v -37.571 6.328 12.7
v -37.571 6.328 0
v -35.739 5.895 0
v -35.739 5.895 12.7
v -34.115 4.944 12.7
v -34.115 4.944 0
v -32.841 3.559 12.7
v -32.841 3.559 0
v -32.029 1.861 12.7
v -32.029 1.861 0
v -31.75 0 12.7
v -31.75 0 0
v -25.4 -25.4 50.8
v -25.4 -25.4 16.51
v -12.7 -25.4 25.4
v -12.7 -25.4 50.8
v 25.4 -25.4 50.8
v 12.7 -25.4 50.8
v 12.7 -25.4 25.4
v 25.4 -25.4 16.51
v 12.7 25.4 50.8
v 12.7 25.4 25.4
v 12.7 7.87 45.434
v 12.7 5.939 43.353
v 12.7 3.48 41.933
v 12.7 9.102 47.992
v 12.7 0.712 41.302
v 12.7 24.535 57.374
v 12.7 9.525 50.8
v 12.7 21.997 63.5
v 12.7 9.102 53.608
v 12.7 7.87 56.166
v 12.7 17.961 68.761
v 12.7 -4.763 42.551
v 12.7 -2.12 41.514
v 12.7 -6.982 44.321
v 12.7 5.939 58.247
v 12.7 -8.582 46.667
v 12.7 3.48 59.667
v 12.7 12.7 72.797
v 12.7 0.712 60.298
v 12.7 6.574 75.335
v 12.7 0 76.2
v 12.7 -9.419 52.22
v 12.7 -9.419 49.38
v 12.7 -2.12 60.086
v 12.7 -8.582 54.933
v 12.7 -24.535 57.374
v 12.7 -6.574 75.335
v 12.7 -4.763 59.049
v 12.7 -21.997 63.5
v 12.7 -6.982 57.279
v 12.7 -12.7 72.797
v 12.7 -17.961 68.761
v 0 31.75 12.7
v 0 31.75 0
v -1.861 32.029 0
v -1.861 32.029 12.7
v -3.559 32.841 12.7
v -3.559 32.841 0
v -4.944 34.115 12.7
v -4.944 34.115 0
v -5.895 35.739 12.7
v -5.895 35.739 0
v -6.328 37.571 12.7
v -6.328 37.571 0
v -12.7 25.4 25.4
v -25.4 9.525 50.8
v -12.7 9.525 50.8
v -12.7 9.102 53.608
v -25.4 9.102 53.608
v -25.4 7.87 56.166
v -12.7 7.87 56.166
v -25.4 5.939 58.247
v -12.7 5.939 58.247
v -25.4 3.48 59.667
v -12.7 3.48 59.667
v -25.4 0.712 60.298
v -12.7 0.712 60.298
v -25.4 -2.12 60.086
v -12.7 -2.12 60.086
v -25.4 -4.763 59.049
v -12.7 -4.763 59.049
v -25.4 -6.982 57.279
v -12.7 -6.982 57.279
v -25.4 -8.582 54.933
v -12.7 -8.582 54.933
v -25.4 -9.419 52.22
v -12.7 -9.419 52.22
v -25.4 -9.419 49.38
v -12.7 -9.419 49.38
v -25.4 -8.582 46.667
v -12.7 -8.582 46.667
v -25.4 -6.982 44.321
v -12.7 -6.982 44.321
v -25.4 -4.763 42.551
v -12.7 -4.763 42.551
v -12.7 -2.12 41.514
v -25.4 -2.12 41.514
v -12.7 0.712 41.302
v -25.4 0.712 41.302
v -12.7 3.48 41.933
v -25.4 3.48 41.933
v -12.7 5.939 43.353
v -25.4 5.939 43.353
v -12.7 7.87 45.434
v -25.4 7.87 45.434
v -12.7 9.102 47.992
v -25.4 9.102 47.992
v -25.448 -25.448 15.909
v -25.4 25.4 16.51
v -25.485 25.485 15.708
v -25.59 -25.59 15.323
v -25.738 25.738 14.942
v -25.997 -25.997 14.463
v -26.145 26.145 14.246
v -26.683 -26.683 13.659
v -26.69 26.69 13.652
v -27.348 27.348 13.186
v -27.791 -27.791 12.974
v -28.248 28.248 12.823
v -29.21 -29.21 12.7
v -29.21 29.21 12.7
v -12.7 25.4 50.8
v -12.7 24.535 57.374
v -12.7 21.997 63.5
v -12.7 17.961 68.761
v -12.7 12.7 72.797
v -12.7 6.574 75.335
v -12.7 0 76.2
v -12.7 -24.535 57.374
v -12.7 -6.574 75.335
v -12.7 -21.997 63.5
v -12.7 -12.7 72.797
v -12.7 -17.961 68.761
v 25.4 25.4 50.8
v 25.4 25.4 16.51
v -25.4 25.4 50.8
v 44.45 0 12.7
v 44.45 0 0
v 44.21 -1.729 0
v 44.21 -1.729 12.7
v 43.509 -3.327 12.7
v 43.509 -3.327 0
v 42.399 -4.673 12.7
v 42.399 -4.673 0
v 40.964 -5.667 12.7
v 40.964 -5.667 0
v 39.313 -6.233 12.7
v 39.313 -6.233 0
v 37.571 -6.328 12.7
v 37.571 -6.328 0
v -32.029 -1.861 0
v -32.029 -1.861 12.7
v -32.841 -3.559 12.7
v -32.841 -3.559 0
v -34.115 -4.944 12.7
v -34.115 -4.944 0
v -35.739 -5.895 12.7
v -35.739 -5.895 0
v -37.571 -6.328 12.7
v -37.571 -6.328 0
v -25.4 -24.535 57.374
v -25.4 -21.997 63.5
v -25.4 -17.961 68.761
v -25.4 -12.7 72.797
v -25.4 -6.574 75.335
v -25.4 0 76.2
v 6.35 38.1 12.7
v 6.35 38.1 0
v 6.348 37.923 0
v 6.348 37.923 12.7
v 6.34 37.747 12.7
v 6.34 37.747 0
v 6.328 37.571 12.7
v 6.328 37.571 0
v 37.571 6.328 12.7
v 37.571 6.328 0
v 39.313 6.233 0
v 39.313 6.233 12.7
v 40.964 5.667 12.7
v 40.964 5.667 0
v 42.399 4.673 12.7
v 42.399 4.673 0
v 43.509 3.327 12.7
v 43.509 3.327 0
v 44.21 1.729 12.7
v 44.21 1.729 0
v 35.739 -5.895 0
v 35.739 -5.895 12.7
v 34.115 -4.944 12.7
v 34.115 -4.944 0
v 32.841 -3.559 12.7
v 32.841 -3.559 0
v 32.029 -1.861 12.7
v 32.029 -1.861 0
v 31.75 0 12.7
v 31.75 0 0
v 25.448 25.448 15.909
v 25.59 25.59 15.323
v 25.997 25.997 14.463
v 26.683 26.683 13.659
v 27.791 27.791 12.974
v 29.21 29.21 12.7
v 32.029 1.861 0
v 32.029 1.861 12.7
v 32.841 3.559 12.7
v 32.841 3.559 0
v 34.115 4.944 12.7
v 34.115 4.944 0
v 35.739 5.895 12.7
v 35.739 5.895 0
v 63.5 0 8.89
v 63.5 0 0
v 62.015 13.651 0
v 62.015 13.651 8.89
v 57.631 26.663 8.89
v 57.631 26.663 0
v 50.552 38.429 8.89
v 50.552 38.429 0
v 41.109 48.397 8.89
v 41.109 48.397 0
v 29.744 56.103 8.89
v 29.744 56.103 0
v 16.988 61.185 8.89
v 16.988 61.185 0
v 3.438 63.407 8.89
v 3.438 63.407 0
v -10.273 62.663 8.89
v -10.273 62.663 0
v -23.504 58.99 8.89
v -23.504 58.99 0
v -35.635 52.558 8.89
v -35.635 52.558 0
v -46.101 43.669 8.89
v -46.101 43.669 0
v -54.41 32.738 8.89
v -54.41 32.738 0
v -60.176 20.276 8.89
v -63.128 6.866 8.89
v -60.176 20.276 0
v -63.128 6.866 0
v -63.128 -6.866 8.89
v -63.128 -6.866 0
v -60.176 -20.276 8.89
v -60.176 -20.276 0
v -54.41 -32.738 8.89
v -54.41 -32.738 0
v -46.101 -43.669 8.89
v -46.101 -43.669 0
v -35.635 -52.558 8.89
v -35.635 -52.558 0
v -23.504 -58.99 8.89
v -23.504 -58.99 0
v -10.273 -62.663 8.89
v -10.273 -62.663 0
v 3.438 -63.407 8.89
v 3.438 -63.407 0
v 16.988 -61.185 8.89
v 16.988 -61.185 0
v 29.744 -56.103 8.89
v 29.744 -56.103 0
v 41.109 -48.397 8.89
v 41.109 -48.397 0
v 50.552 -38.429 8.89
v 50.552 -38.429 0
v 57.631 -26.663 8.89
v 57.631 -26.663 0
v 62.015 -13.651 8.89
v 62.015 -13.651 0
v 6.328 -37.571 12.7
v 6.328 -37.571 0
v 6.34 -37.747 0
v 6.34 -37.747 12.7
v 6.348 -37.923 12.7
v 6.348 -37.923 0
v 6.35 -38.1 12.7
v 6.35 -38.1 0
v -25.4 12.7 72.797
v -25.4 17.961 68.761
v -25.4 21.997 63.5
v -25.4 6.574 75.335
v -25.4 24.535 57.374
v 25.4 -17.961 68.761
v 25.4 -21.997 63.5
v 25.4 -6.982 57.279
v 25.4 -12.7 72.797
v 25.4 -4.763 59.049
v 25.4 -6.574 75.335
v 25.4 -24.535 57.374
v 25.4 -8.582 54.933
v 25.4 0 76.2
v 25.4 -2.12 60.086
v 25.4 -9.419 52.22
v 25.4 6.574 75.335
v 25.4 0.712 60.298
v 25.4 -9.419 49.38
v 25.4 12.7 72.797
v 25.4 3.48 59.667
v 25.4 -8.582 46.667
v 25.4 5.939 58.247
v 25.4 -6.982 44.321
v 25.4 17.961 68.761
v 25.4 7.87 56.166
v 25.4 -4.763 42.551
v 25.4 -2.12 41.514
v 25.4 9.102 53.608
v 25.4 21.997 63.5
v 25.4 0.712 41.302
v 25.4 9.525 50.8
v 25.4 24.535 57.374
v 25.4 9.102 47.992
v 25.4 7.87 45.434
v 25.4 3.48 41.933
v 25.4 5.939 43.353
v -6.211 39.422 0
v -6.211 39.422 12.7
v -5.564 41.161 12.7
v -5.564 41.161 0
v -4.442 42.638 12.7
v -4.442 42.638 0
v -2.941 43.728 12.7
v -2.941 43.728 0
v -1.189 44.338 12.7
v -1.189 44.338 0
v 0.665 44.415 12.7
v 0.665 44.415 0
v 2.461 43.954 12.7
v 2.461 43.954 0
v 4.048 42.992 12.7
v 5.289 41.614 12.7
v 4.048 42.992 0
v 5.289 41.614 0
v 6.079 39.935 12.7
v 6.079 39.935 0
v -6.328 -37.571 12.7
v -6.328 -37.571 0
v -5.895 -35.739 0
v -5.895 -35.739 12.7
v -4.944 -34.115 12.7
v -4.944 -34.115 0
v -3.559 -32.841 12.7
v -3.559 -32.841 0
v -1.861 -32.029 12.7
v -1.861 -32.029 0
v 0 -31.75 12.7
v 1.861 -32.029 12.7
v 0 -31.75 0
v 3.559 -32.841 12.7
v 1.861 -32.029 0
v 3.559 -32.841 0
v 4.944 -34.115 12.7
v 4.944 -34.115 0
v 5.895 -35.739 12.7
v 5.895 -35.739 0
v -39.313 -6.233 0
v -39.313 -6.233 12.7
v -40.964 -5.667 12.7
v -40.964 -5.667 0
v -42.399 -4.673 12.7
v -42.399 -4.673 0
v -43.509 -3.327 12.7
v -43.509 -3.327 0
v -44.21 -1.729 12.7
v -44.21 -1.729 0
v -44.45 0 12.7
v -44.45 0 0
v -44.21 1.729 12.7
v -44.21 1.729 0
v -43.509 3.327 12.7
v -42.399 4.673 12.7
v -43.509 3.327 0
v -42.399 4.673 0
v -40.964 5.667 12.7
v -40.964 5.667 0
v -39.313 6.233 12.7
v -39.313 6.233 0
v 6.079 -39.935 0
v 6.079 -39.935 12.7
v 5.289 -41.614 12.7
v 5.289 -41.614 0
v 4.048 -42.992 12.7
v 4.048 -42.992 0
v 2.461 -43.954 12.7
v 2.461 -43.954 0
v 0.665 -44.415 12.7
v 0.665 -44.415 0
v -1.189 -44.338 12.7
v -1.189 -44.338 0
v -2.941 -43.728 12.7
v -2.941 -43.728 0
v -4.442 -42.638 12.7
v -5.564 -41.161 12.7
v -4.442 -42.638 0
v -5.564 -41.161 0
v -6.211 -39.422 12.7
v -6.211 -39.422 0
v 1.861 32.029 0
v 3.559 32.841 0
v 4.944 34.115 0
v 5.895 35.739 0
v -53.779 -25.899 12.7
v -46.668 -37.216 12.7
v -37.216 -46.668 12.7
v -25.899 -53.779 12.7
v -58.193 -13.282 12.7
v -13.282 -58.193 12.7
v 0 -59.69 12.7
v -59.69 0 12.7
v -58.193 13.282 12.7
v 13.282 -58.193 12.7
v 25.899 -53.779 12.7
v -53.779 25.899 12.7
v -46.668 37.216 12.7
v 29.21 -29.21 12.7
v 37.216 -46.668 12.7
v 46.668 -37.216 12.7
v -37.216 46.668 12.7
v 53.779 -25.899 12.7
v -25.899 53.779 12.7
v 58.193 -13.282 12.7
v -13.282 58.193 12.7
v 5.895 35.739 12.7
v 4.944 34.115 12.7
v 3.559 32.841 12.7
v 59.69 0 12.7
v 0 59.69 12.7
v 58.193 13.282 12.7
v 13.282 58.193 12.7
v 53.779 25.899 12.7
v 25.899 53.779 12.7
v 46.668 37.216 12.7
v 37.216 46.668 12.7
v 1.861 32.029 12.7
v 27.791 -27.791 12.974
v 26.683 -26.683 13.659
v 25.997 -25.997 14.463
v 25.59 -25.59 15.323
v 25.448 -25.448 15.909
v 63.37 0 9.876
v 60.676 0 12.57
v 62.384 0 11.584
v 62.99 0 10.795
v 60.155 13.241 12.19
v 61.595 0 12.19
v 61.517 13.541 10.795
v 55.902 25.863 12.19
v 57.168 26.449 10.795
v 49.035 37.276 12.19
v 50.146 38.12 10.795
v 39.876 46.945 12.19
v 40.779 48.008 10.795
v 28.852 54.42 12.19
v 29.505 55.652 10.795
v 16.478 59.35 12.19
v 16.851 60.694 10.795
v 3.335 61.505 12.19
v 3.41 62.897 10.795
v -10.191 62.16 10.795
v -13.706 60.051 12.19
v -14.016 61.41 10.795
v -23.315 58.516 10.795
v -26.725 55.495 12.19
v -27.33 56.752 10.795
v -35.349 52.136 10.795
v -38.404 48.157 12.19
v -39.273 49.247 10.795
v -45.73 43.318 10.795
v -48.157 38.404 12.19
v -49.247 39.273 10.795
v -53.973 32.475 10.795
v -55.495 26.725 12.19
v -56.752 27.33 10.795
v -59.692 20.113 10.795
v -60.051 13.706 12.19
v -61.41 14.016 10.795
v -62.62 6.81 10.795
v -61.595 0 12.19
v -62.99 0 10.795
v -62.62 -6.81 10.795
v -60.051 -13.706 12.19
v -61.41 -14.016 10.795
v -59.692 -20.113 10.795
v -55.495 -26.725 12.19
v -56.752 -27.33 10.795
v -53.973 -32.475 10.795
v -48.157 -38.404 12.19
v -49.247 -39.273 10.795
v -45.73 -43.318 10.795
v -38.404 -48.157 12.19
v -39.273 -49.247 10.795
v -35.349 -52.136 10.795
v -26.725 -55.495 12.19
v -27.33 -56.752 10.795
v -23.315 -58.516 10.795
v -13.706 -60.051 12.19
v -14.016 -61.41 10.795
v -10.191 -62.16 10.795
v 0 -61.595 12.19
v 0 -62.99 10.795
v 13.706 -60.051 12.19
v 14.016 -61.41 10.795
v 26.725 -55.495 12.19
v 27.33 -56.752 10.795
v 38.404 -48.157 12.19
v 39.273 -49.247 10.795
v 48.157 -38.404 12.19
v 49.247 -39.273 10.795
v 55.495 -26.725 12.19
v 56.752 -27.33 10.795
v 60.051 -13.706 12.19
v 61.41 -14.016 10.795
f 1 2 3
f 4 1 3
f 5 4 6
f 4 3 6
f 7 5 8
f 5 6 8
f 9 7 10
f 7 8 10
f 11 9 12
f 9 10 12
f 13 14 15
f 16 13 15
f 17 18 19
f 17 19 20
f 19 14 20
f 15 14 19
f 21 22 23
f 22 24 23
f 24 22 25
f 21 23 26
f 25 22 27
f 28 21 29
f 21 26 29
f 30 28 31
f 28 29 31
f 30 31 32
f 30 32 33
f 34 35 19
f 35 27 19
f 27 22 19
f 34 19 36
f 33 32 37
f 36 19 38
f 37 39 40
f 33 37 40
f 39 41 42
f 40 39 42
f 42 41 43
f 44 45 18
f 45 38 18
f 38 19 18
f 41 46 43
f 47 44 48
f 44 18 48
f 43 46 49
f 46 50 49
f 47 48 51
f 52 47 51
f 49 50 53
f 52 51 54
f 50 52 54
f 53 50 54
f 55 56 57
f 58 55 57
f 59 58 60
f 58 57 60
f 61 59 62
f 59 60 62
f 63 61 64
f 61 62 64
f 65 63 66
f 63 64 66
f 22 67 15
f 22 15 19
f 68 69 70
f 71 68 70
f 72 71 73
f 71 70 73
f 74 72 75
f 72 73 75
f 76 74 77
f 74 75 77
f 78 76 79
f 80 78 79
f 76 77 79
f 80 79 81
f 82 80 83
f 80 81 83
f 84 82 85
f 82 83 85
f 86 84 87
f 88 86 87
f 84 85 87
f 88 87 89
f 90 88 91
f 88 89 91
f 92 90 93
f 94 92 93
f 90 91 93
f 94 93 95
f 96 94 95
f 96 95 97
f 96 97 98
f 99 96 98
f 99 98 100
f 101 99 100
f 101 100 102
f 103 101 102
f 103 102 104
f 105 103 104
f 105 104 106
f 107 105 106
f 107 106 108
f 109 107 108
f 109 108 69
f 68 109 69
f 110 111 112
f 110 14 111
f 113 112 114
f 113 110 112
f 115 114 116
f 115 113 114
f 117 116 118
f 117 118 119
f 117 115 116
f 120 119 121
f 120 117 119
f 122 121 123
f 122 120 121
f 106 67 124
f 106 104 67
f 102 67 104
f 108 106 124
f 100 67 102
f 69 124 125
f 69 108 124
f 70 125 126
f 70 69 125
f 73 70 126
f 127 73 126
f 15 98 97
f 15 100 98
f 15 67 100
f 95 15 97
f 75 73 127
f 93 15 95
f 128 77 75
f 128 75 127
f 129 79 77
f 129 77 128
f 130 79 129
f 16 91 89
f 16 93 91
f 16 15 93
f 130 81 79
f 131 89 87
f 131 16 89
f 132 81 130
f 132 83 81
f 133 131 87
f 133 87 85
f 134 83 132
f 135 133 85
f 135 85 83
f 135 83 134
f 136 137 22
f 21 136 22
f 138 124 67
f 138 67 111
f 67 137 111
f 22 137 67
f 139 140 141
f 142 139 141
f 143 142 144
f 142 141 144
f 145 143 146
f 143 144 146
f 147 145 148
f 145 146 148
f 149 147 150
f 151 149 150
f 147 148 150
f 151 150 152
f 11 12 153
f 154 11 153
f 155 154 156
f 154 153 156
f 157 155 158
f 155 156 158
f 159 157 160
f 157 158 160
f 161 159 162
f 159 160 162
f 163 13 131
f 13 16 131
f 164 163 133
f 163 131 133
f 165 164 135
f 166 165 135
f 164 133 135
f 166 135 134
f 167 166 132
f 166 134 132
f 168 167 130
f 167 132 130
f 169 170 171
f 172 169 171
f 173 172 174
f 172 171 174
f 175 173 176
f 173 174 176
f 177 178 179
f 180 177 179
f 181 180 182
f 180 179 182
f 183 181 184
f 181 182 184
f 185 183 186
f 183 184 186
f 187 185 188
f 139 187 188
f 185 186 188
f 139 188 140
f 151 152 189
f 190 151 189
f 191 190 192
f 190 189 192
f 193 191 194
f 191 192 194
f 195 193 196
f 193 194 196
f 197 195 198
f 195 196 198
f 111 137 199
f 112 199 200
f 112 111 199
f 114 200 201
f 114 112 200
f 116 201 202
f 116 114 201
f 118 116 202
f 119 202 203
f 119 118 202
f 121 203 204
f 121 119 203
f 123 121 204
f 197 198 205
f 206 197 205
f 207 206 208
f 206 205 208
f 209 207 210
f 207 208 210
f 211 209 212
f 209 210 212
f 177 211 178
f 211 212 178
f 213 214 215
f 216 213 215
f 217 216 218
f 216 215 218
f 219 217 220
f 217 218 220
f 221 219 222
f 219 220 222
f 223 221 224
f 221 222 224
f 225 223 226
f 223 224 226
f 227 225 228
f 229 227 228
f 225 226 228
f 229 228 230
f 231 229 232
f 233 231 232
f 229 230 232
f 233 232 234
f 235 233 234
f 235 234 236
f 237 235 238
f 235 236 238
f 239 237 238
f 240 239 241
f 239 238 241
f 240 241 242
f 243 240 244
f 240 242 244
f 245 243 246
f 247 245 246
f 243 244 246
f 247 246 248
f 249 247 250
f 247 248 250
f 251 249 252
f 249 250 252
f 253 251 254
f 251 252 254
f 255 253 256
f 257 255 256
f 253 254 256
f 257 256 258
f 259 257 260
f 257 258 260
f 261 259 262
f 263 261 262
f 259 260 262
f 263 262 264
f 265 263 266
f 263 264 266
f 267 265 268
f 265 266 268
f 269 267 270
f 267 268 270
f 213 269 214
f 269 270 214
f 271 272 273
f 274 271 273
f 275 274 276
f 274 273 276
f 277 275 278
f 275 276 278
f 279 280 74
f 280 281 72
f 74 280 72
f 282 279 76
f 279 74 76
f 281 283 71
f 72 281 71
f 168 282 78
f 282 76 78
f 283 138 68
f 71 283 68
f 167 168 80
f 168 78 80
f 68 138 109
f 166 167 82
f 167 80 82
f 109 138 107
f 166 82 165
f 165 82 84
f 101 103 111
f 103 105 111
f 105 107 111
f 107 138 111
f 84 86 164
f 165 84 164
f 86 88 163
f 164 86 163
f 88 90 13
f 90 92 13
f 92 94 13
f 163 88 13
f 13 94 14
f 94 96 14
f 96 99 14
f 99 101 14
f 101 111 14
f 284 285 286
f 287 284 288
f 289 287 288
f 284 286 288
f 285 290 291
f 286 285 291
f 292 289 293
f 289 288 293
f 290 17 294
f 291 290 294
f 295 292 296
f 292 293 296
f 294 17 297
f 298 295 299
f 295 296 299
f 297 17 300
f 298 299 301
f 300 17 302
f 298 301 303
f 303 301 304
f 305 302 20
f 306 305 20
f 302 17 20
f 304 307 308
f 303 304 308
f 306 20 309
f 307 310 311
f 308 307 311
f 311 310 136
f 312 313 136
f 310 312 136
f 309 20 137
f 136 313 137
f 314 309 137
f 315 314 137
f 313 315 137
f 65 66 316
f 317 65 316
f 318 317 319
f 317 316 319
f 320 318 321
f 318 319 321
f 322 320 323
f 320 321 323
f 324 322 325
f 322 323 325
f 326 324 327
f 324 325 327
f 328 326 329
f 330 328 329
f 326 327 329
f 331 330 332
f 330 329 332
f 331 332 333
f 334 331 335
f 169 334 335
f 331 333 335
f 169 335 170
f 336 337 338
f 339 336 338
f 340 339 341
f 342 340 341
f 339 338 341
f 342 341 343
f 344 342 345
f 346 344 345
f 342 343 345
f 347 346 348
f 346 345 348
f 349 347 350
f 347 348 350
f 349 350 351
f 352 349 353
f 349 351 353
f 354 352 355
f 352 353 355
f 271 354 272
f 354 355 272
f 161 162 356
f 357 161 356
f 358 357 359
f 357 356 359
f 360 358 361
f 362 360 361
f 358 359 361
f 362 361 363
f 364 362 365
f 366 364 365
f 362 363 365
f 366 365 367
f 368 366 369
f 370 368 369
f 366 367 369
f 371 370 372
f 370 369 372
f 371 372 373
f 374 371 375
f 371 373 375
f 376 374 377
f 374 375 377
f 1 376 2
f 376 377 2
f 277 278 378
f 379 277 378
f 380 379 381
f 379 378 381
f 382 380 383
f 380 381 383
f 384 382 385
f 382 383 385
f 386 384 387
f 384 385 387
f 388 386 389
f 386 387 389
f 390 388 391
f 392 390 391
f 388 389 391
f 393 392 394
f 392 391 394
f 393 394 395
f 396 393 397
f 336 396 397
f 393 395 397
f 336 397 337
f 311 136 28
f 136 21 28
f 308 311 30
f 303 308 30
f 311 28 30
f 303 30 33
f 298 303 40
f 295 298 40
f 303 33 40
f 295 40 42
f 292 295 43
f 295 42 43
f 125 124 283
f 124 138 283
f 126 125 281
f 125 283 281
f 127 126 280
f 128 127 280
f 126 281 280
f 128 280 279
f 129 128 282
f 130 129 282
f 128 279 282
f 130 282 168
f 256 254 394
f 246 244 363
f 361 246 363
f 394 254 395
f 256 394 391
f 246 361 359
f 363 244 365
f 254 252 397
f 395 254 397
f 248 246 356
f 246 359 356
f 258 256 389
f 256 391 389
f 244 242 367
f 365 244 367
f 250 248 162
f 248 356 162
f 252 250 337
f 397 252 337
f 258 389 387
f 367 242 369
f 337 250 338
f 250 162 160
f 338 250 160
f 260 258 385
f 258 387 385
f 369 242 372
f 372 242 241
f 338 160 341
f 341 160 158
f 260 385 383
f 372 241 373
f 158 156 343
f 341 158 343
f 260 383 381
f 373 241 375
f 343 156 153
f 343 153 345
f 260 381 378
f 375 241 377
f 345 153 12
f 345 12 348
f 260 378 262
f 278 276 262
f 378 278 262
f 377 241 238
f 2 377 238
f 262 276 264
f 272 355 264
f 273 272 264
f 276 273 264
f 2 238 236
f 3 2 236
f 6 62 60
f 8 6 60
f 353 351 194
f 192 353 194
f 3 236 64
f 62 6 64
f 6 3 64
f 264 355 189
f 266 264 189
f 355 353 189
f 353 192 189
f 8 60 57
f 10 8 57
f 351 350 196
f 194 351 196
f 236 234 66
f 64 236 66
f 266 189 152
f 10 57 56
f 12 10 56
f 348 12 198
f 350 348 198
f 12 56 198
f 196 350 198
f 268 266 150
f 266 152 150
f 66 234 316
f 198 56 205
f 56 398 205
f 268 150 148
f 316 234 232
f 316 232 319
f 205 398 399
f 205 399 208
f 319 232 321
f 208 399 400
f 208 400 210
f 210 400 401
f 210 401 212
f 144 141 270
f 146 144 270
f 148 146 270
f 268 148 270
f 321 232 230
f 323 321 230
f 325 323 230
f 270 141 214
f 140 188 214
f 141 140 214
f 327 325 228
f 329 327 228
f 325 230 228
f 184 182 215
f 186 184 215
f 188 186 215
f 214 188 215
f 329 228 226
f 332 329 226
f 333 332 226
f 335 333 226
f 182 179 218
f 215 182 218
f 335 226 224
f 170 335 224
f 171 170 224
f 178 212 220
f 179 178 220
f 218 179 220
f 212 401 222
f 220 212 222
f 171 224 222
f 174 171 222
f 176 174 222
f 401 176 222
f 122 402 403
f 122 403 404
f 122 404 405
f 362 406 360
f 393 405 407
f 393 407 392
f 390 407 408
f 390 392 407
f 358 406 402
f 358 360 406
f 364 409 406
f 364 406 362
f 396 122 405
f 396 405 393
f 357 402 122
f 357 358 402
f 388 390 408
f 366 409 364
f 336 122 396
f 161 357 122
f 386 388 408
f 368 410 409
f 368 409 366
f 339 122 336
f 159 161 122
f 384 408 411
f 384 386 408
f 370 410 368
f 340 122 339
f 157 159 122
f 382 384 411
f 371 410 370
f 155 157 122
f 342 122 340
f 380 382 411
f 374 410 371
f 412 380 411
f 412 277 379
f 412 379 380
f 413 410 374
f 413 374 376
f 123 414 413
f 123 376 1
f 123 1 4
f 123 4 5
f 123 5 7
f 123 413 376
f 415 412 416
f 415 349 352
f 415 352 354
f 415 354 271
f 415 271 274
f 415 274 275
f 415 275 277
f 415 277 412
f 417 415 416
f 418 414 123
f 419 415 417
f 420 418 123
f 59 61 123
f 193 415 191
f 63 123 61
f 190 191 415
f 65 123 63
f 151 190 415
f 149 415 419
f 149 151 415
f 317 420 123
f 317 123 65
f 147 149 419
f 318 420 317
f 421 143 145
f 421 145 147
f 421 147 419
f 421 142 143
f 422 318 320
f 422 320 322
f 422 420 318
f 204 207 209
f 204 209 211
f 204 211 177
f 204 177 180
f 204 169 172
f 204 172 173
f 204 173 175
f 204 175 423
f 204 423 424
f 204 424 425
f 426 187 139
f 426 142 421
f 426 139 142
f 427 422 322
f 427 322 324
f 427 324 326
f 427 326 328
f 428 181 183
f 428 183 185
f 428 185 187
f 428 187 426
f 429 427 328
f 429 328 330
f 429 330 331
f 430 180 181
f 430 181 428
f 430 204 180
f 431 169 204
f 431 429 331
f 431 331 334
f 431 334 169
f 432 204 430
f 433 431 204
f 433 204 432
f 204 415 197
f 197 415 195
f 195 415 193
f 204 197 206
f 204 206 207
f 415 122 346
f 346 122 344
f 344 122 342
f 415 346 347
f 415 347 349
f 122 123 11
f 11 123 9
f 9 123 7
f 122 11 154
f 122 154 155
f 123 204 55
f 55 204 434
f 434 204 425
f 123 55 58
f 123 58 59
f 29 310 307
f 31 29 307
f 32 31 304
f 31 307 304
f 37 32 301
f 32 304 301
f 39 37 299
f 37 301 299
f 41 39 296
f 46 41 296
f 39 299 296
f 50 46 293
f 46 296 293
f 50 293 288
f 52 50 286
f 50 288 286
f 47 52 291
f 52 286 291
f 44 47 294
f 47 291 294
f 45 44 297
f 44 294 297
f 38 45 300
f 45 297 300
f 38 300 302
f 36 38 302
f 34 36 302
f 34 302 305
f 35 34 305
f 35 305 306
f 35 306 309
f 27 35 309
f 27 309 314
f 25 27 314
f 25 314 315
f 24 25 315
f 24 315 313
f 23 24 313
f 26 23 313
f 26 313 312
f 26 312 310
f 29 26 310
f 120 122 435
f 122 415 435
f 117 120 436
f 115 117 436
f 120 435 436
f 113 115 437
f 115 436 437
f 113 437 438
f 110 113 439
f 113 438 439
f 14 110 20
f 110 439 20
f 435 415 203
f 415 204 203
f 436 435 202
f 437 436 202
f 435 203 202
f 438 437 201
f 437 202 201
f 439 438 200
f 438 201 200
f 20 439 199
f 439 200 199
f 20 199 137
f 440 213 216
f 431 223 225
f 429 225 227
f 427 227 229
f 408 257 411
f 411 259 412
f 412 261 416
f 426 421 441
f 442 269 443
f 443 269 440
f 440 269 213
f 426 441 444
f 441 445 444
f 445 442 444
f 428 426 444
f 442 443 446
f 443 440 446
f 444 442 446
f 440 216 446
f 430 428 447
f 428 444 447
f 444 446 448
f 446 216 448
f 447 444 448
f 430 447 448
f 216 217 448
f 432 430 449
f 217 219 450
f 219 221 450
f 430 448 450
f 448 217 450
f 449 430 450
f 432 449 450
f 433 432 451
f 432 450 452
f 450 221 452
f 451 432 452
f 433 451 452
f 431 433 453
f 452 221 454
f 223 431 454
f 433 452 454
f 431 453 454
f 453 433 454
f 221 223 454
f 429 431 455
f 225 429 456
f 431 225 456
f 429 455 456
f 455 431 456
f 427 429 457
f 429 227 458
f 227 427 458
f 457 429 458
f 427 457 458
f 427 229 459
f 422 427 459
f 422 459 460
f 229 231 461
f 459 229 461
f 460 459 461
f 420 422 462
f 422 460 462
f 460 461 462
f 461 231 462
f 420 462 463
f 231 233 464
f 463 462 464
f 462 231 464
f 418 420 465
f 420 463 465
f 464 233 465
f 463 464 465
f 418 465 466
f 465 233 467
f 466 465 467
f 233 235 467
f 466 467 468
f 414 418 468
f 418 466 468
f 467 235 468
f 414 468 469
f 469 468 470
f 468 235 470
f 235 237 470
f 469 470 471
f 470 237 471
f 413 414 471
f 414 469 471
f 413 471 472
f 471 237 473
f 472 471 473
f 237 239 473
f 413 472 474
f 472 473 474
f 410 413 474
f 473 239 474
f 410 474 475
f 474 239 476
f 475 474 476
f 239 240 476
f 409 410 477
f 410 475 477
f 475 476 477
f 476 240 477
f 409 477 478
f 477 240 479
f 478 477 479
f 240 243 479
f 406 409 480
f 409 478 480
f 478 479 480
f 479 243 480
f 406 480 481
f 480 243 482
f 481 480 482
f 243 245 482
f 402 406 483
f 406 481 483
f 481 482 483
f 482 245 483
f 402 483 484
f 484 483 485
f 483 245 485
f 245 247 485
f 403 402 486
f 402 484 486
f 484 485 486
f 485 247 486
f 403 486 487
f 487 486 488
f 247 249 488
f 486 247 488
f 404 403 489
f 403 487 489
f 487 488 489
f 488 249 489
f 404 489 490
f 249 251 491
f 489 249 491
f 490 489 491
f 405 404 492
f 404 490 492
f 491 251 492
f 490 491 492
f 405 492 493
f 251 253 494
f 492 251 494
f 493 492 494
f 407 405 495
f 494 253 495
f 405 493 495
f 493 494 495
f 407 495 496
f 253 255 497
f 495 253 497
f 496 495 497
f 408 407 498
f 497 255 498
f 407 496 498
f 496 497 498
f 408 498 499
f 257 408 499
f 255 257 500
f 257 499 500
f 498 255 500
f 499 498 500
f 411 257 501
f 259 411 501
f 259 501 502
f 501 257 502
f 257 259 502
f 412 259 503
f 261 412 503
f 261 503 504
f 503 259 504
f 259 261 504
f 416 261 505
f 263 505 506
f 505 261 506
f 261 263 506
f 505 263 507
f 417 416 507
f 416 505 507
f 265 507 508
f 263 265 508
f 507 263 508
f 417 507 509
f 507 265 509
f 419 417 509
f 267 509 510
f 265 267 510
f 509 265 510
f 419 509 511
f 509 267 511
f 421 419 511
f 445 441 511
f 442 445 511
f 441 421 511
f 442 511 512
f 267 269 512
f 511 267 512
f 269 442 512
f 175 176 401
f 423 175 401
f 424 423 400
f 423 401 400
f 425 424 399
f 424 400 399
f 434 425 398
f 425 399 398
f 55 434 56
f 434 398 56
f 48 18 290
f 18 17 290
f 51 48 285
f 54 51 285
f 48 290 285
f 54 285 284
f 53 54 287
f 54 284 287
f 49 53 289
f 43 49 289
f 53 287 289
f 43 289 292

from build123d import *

# Parameters (mm, degrees)
F0_R     = 63.5
F1_DEPTH = 12.7
F3_DEPTH = 63.5
F4_W     = 25.4
F4_H     = 50.8
F5_DEPTH = 50.8
F7_DEPTH = 127
F8_R     = 25.39999
F9_R     = 3.81


# Not quite as in the source:
# - a fillet or chamfer is up to 0.001 mm smaller than in the source, because OpenCascade refuses the exact size


with BuildPart() as f1:
    # F0 (on Top) → F1 (new body)
    with BuildSketch(Plane.XY):
        Circle(F0_R)
        with BuildLine():
            ThreePointArc((6.3279129766, -37.5708333333), (6.3444758413, -37.835186293), (6.35, -38.1))
            ThreePointArc((6.35, -38.1), (-0.264813707, -44.4444758413), (-6.3279129766, -37.5708333333))
            ThreePointArc((-6.3279129766, -37.5708333333), (0, -31.75), (6.3279129766, -37.5708333333))
        make_face(mode=Mode.SUBTRACT)
        with BuildLine():
            ThreePointArc((-37.5708333333, 6.3279129766), (-33.4265265416, 4.2989703225), (-31.75, 0))
            ThreePointArc((-31.75, 0), (-33.4265265416, -4.2989703225), (-37.5708333333, -6.3279129766))
            ThreePointArc((-37.5708333333, -6.3279129766), (-44.45, 0), (-37.5708333333, 6.3279129766))
        make_face(mode=Mode.SUBTRACT)
        with BuildLine():
            ThreePointArc((37.5708333333, -6.3279129766), (33.4265265416, -4.2989703225), (31.75, 0))
            ThreePointArc((31.75, 0), (33.4265265416, 4.2989703225), (37.5708333333, 6.3279129766))
            ThreePointArc((37.5708333333, 6.3279129766), (42.3989703225, 4.6734734584), (44.45, 0))
            ThreePointArc((44.45, 0), (42.3989703225, -4.6734734584), (37.5708333333, -6.3279129766))
        make_face(mode=Mode.SUBTRACT)
        with BuildLine():
            ThreePointArc((6.35, 38.1), (6.3444758413, 37.835186293), (6.3279129766, 37.5708333333))
            ThreePointArc((6.3279129766, 37.5708333333), (4.2989703225, 33.4265265416), (0, 31.75))
            ThreePointArc((0, 31.75), (-4.2989703225, 33.4265265416), (-6.3279129766, 37.5708333333))
            ThreePointArc((-6.3279129766, 37.5708333333), (-0.264813707, 44.4444758413), (6.35, 38.1))
        make_face(mode=Mode.SUBTRACT)
    extrude(amount=F1_DEPTH)

    # F2 (on face) → F3 (join)
    with BuildSketch(Plane.XY.offset(12.7)):
        Polygon((25.4, 25.4), (0, 25.4), (-25.4, 25.4), (-25.4, -25.4), (25.4, -25.4), align=None)
    extrude(amount=F3_DEPTH)

    # F4 (on face) → F5 (cut)
    with BuildSketch(Plane.XZ.offset(25.4)):
        with Locations((0, 50.8)):
            Rectangle(F4_W, F4_H)
    extrude(amount=-F5_DEPTH, mode=Mode.SUBTRACT)

    # F6 (on face) → F7 (cut)
    with BuildSketch(Plane.YZ.offset(25.4)):
        with BuildLine():
            ThreePointArc((9.525, 50.8), (6.7351920908, 57.5351920908), (0, 60.325))
            Line((0, 60.325), (0, 50.8))
            Line((0, 50.8), (0, 41.275))
            ThreePointArc((0, 41.275), (6.7351920908, 44.0648079092), (9.525, 50.8))
        make_face()
        with BuildLine():
            Line((0, 50.8), (0, 60.325))
            ThreePointArc((0, 60.325), (-9.525, 50.8), (0, 41.275))
            Line((0, 41.275), (0, 50.8))
        make_face()
    extrude(amount=-F7_DEPTH, mode=Mode.SUBTRACT)

    # F8 (radius 25.4 in the source; OpenCascade refuses exactly that, so slightly less here)
    f8_edges = [f1.edges().sort_by_distance(p)[0] for p in [
        (19.05, -25.4, 76.2),
        (19.05, 25.4, 76.2),
        (-19.05, -25.4, 76.2),
        (-19.05, 25.4, 76.2),
    ]]
    fillet(f8_edges, radius=F8_R)

    # F9
    f9_edges = [f1.edges().sort_by_distance(p)[0] for p in [
        (-63.5, 0, 12.7),
        (25.4, 0, 12.7),
        (0, -25.4, 12.7),
        (0, 25.4, 12.7),
        (-25.4, 0, 12.7),
    ]]
    fillet(f9_edges, radius=F9_R)


solid = f1.part
